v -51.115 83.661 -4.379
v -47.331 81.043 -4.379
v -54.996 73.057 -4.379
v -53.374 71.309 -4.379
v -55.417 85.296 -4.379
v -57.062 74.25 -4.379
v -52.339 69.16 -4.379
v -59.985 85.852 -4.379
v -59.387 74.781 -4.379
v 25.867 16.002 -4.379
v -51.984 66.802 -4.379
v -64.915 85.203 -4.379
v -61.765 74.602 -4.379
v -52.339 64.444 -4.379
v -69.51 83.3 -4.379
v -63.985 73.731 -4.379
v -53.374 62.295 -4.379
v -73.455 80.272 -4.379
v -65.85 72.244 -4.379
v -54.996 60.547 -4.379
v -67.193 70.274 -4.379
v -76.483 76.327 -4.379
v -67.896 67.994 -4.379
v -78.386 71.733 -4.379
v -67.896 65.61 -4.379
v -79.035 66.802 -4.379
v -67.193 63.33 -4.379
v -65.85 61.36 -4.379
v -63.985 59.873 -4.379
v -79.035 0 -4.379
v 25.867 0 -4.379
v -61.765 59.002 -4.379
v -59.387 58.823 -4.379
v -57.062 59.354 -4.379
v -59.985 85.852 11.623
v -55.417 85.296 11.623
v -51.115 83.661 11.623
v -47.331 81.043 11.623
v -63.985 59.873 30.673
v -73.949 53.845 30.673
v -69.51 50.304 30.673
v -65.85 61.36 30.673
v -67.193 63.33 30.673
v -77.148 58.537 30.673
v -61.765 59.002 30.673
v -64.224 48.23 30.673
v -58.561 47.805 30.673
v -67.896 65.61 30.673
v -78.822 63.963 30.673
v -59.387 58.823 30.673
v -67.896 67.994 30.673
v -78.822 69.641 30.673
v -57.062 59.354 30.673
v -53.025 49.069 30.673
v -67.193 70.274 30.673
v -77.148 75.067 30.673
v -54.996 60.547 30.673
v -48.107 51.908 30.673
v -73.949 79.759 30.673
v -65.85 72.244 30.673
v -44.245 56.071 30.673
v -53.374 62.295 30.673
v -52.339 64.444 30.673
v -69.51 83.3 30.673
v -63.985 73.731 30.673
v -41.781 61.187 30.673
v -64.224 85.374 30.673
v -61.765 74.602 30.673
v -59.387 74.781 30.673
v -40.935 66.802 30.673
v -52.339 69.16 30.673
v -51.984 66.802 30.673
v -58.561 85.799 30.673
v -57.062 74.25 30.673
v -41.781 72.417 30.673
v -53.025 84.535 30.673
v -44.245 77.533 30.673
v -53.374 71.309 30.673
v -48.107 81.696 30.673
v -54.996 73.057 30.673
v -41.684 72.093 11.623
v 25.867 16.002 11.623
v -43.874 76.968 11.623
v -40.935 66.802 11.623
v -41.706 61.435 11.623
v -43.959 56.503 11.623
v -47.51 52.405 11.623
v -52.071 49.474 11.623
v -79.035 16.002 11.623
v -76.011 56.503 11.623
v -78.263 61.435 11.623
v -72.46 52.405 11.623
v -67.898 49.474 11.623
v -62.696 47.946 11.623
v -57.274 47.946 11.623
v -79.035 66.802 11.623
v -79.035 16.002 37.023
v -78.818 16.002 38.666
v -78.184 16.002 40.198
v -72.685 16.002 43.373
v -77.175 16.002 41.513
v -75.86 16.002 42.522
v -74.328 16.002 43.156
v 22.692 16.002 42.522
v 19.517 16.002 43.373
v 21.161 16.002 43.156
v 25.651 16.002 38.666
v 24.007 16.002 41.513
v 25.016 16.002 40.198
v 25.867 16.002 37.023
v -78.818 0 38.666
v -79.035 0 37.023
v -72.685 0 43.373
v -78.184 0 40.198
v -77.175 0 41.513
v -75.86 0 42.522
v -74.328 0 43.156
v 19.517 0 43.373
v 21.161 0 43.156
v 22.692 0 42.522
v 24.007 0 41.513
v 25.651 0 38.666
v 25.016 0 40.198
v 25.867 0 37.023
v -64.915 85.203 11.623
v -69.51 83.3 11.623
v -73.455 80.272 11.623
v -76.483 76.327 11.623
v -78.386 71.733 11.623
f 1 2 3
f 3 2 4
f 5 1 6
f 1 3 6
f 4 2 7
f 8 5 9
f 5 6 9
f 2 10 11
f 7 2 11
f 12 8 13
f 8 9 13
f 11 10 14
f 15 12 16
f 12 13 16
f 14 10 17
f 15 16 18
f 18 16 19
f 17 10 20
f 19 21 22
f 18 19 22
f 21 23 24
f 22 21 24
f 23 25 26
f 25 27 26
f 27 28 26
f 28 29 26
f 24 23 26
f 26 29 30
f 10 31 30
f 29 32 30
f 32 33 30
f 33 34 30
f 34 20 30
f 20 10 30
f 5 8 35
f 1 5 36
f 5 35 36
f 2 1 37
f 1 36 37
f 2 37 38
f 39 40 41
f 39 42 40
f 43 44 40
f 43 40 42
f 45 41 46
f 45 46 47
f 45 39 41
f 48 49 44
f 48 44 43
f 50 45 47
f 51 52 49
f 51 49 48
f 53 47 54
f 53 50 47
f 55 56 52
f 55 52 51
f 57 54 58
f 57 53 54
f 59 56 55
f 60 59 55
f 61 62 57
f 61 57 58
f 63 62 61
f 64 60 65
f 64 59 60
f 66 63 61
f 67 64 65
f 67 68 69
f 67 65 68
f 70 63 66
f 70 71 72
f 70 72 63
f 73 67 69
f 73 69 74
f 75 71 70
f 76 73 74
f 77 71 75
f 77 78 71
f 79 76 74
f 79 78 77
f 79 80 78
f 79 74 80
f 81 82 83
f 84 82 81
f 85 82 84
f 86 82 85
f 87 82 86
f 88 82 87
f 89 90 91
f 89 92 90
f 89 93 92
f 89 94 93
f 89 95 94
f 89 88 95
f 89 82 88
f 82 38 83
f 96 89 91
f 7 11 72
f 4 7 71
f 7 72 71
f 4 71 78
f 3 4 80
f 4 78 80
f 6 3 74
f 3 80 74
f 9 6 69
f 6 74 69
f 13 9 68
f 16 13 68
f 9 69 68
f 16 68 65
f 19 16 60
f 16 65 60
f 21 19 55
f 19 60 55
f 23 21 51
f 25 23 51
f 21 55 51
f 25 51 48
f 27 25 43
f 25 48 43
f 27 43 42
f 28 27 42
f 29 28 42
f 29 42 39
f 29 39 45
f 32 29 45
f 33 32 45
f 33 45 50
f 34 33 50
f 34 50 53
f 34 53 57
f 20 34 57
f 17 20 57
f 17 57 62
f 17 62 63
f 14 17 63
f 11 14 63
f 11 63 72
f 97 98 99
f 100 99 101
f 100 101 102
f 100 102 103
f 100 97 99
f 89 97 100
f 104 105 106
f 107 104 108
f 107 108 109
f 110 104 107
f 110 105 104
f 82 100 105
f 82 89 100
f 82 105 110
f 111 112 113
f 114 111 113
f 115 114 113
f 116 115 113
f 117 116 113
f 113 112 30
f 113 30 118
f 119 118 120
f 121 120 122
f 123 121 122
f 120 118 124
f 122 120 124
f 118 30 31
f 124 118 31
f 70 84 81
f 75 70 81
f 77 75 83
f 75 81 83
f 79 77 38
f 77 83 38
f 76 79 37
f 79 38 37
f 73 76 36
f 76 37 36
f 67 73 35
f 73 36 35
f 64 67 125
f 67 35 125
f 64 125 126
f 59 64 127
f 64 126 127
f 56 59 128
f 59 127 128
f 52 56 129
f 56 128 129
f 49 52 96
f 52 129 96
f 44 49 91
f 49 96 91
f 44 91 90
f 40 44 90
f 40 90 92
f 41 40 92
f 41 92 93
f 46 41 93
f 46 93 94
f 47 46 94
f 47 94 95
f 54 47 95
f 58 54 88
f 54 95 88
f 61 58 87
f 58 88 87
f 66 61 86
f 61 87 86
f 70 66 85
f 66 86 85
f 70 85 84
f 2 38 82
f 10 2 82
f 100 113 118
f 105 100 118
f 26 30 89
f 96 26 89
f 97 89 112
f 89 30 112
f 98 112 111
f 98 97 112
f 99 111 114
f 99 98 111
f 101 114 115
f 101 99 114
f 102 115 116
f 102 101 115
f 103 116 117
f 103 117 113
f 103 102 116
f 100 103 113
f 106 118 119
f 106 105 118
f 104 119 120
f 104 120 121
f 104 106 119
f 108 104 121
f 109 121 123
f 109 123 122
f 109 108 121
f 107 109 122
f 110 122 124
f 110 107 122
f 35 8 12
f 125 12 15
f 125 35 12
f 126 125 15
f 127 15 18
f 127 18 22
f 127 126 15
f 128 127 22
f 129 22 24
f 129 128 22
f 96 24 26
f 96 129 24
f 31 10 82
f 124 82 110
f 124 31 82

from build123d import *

# Parameters (mm, degrees)
SKETCH1_W               = 104.902
SKETCH1_H               = 47.752
EXTRUDE1_DEPTH          = 16.002
FILLET1_R               = 6.35
SKETCH2_W               = 104.902
SKETCH2_H               = 16.002
EXTRUDE2_DEPTH          = 69.85
CUT_EXTRUDE1_DEPTH      = 69.85
CUT_EXTRUDE3_DEPTH      = 32.75
CUT_EXTRUDE3_DEPTH_BACK = 17.002
SKETCH5_R               = 19.05
EXTRUDE3_DEPTH          = 19.05
SKETCH6_R               = 8.001
CUT_EXTRUDE4_DEPTH      = 36.052


with BuildPart() as part:
    # Sketch1 → Extrude1 (new body)
    with BuildSketch(Plane(origin=(0, 0, 0), x_dir=(1, 0, 0), z_dir=(0, 1, 0))):
        with Locations((-26.583821429, -19.496767857)):
            Rectangle(SKETCH1_W, SKETCH1_H)
    extrude(amount=EXTRUDE1_DEPTH)

    # Fillet1
    fillet1_edges = [part.edges().sort_by_distance(p)[0] for p in [
        (25.867178571, 8.001, 43.372767857),
        (-79.034821429, 8.001, 43.372767857),
    ]]
    fillet(fillet1_edges, radius=FILLET1_R)

    # Sketch2 → Extrude2 (add)
    with BuildSketch(Plane(origin=(0, 16.002, 0), x_dir=(-1, 0, 0), z_dir=(0, 1, 0))):
        with Locations((26.583821429, 3.621767857)):
            Rectangle(SKETCH2_W, SKETCH2_H)
    extrude(amount=EXTRUDE2_DEPTH)

    # Sketch3 → Cut-Extrude1 (cut)
    with BuildSketch(Plane.XY.offset(11.622767857)):
        with BuildLine():
            ThreePointArc((-59.984821429, 85.852), (-53.216510402, 84.609090325), (-47.331390899, 81.042547596))
            Line((-47.331390899, 81.042547596), (25.867178571, 16.002))
            Line((25.867178571, 16.002), (25.867178571, 85.852))
            Line((25.867178571, 85.852), (-59.984821429, 85.852))
        make_face()
    extrude(amount=-CUT_EXTRUDE1_DEPTH, mode=Mode.SUBTRACT)

    # Sketch4 → Cut-Extrude3 (cut, two sides)
    with BuildSketch(Plane.XY.offset(11.622767857)) as cut_extrude3_sk:
        with BuildLine():
            Line((198.747458809, 85.852), (-59.984821429, 85.852))
            ThreePointArc((-59.984821429, 85.852), (-73.45520561, 80.272384182), (-79.034821429, 66.802))
            Line((-79.034821429, 66.802), (-79.034821429, -191.930280237))
            Line((-79.034821429, -191.930280237), (-444.937521164, 173.972419498))
            Line((-444.937521164, 173.972419498), (-167.155240927, 451.754699735))
            Line((-167.155240927, 451.754699735), (198.747458809, 85.852))
        make_face()
    extrude(amount=CUT_EXTRUDE3_DEPTH, mode=Mode.SUBTRACT)
    extrude(cut_extrude3_sk.sketch, amount=-CUT_EXTRUDE3_DEPTH_BACK, mode=Mode.SUBTRACT)

    # Sketch5 → Extrude3 (add)
    with BuildSketch(Plane.XY.offset(11.622767857)):
        with Locations((-59.984821429, 66.802)):
            Circle(SKETCH5_R)
    extrude(amount=EXTRUDE3_DEPTH)

    # Sketch6 → Cut-Extrude4 (cut, through all)
    with BuildSketch(Plane.XY.offset(30.672767857)):
        with Locations((-59.984821429, 66.802)):
            Circle(SKETCH6_R)
    extrude(amount=-CUT_EXTRUDE4_DEPTH, mode=Mode.SUBTRACT)


solid = part.part
